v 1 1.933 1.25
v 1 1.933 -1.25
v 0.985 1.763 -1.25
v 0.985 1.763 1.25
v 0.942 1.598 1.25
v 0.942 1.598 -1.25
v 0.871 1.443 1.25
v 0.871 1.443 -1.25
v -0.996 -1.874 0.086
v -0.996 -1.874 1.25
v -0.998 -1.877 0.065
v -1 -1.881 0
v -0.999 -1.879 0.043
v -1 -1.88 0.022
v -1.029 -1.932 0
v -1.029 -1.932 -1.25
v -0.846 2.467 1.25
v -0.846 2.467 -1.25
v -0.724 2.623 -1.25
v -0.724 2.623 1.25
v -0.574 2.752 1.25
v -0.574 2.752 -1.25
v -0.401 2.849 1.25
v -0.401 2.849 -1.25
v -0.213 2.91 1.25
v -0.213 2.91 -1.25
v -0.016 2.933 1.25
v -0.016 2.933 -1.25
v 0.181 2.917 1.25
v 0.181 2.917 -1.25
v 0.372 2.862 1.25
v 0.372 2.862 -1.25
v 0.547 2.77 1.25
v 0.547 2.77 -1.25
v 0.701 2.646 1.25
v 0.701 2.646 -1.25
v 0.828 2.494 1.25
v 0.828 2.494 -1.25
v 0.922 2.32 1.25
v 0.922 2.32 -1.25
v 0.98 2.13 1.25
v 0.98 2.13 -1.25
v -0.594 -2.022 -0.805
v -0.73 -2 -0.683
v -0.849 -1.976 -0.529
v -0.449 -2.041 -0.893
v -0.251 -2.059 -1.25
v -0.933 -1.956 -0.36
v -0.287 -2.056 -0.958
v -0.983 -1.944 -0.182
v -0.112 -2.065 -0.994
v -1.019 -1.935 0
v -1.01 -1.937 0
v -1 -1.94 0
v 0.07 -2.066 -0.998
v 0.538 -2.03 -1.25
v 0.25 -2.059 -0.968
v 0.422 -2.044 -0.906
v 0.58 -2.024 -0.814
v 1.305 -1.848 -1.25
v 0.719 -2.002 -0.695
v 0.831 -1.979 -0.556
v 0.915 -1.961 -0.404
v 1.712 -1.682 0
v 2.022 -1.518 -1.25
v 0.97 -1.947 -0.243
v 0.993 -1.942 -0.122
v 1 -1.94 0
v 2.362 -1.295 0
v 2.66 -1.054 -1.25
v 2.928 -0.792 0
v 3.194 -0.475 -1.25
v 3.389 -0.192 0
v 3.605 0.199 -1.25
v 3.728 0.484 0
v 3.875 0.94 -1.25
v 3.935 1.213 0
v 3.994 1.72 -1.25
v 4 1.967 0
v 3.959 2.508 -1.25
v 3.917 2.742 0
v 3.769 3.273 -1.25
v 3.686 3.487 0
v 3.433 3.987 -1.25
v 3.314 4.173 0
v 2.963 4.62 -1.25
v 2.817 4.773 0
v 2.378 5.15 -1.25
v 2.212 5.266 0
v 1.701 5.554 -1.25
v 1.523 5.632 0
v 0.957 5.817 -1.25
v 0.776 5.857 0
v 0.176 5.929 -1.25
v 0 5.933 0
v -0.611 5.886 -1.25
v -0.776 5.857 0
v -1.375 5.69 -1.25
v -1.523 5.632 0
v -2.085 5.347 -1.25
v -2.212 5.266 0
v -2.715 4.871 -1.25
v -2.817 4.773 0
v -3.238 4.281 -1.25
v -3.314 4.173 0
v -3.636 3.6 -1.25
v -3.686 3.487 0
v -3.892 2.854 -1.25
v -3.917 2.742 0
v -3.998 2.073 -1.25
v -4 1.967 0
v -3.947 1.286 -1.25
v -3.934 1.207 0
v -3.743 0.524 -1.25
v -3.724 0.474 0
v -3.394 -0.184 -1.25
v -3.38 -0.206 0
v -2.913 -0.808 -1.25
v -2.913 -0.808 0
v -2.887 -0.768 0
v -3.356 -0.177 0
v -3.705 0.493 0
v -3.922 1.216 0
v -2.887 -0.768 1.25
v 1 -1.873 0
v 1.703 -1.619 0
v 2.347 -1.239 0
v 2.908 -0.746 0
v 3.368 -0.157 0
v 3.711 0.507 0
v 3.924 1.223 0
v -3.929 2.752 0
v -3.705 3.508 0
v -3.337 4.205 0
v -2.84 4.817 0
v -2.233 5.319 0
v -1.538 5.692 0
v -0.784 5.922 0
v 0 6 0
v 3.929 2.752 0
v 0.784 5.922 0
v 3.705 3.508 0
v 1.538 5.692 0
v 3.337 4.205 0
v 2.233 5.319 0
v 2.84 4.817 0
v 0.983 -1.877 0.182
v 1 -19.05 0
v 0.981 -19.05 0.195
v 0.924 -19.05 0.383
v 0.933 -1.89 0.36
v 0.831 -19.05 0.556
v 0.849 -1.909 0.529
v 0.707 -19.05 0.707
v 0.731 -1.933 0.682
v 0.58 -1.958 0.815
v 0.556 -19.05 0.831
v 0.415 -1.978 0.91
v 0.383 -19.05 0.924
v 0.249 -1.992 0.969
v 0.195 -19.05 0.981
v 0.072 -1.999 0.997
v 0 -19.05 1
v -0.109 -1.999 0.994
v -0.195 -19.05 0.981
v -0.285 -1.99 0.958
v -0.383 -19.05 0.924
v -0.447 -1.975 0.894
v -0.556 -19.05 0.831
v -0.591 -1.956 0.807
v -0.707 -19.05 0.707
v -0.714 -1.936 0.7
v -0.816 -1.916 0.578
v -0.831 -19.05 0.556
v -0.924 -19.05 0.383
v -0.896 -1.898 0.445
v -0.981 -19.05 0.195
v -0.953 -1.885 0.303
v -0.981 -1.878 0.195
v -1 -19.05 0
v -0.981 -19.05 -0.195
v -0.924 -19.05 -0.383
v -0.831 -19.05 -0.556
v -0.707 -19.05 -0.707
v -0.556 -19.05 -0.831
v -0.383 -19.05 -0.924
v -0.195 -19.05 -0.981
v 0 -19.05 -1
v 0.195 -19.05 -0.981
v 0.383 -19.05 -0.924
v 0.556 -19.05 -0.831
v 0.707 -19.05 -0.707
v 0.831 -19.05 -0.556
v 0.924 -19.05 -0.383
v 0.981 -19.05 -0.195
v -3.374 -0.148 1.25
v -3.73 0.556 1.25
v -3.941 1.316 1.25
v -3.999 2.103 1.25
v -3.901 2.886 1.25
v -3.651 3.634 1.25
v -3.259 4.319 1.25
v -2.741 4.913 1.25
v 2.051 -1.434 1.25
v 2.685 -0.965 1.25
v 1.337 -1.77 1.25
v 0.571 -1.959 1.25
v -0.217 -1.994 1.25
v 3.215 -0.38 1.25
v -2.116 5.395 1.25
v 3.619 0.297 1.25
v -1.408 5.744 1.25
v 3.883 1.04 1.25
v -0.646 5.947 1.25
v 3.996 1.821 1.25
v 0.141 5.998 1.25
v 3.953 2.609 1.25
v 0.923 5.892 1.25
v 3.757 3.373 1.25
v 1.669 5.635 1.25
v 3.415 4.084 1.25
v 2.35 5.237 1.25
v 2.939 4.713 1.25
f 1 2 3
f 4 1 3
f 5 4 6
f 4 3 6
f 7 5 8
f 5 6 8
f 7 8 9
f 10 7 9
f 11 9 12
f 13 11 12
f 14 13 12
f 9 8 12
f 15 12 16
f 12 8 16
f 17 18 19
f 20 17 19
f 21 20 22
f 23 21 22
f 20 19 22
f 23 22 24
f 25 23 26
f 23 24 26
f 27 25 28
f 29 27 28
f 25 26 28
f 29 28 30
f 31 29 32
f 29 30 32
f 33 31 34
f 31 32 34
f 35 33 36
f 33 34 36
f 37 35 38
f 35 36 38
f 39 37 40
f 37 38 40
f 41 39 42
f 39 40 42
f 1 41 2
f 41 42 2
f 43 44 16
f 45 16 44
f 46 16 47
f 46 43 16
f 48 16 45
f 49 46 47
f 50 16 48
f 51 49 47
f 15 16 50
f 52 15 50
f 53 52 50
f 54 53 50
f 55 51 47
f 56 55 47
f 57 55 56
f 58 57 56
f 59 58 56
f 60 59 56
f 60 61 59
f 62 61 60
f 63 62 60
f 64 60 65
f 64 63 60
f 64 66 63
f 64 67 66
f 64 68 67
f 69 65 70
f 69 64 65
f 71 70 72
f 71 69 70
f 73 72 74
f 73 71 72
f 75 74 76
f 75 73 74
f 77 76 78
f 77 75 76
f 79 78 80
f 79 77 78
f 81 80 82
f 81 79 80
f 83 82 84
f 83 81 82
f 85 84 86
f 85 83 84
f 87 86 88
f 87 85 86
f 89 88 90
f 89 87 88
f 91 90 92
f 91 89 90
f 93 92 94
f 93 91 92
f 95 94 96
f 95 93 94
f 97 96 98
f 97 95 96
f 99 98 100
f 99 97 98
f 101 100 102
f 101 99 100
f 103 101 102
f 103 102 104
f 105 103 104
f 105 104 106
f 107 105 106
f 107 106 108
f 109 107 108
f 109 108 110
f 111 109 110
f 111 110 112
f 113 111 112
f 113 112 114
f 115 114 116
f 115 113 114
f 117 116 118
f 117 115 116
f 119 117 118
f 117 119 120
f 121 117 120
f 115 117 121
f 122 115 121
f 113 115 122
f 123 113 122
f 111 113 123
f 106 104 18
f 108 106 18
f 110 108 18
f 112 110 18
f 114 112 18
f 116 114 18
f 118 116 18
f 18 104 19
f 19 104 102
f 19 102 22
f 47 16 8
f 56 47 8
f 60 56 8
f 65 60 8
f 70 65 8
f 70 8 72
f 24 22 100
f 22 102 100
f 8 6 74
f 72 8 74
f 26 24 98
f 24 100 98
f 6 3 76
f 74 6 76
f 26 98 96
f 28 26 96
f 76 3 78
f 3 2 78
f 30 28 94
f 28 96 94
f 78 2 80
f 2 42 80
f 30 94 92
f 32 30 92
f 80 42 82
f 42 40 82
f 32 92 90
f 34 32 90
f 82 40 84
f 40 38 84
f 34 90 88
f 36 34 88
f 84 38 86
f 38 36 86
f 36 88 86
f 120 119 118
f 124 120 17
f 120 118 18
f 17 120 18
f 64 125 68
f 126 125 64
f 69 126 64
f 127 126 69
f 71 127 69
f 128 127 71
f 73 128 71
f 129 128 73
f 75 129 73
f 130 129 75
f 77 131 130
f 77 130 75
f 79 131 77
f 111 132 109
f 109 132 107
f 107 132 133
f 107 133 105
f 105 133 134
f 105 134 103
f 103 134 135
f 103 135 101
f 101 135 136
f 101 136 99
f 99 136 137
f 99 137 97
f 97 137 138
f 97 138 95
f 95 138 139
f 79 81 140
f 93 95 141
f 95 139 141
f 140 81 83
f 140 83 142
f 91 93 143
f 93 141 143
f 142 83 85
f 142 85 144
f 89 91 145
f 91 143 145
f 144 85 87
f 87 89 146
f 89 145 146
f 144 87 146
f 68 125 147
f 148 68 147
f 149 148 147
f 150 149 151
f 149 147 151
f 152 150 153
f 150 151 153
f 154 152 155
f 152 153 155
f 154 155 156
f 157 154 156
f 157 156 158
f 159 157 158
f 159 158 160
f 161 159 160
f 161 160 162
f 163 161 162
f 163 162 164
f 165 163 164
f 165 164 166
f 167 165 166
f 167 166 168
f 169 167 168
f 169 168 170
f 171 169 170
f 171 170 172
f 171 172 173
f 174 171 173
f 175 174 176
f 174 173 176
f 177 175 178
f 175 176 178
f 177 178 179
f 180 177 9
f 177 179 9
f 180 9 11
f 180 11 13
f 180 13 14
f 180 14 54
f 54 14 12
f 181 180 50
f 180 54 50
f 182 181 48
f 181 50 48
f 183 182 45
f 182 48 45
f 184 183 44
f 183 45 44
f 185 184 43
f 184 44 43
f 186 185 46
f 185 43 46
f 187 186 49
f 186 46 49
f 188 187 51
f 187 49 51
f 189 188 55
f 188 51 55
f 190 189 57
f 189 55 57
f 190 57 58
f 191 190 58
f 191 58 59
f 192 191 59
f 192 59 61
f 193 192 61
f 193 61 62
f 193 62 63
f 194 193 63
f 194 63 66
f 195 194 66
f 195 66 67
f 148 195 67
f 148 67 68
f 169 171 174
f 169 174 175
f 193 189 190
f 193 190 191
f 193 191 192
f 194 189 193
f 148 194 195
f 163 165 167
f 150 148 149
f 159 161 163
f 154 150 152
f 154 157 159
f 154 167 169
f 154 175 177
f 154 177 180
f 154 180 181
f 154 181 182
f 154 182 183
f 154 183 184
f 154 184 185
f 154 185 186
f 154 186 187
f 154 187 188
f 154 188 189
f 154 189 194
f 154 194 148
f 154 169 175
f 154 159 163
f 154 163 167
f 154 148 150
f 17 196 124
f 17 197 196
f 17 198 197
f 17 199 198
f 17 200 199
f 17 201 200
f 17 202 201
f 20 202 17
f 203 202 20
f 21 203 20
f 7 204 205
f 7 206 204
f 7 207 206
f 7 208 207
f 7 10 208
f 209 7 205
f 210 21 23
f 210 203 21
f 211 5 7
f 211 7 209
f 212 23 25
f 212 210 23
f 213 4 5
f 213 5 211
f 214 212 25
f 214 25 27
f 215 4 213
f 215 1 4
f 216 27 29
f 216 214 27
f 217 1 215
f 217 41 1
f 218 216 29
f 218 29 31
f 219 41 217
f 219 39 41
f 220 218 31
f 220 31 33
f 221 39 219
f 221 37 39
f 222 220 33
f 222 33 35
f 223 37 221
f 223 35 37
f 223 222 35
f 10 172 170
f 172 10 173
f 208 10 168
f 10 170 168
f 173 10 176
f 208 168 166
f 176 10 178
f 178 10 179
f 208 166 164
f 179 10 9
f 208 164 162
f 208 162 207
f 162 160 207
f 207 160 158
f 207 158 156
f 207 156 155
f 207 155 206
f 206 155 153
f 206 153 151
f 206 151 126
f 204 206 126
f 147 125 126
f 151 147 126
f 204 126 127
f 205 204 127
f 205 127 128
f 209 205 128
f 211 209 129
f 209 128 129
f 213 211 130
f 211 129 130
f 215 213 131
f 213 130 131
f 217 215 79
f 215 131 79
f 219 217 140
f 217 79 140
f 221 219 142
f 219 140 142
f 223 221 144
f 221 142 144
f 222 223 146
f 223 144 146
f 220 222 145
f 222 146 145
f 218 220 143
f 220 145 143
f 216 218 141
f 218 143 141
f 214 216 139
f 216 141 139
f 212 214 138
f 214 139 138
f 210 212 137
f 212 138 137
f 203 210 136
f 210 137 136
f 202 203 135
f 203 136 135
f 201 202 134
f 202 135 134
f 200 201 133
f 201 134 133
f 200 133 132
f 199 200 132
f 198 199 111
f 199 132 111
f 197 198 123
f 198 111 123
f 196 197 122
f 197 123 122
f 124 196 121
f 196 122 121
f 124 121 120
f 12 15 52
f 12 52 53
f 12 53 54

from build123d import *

# Parameters (mm, degrees)
F0_R     = 1
F1_DEPTH = 19.05
F2_R     = 4
F3_DEPTH = 1.25
F4_R     = 4
F5_DEPTH = 1.25
F7_DEPTH = 25
F8_DEPTH = 25


with BuildPart() as f1:
    # F0 (on Front) → F1 (new body)
    with BuildSketch(Plane.XZ):
        Circle(F0_R)
    extrude(amount=F1_DEPTH)

    # F2 (on Top) → F3 (join)
    with BuildSketch(Plane.XY):
        with Locations((0, 2)):
            Circle(F2_R)
    extrude(amount=F3_DEPTH)

    # F4 (on Top) → F5 (join)
    with BuildSketch(Plane.XY):
        with Locations((0, 1.933241)):
            Circle(F4_R)
    extrude(amount=-F5_DEPTH)

    # F6 (on face) → F7 (cut)
    with BuildSketch(Plane(origin=(0, 0, -1.25), x_dir=(1, 0, 0), z_dir=(0, 0, -1))):
        with BuildLine():
            ThreePointArc((-0.845681, -2.46693), (0.277776, -2.893887), (1, -1.933241))
            ThreePointArc((1, -1.933241), (0.967302, -1.679612), (0.871344, -1.442569))
            Line((0.871344, -1.442569), (-0.845681, -2.46693))
        make_face()
        with BuildLine():
            Line((-0.845681, -2.46693), (0.871344, -1.442569))
            ThreePointArc((0.871344, -1.442569), (-0.512341, -1.074459), (-0.845681, -2.46693))
        make_face()
    extrude(amount=-F7_DEPTH, mode=Mode.SUBTRACT)

    # F6 (on face) → F8 (cut)
    with BuildSketch(Plane(origin=(0, 0, -1.25), x_dir=(1, 0, 0), z_dir=(0, 0, -1))):
        with BuildLine():
            ThreePointArc((-0.845681, -2.46693), (-0.512341, -1.074459), (0.871344, -1.442569))
            Line((0.871344, -1.442569), (-1.029019, 1.932134))
            ThreePointArc((-1.029019, 1.932134), (-2.049337, 1.501904), (-2.912605, 0.808425))
            Line((-2.912605, 0.808425), (-0.845681, -2.46693))
        make_face()
    extrude(amount=-F8_DEPTH, mode=Mode.SUBTRACT)


solid = f1.part
